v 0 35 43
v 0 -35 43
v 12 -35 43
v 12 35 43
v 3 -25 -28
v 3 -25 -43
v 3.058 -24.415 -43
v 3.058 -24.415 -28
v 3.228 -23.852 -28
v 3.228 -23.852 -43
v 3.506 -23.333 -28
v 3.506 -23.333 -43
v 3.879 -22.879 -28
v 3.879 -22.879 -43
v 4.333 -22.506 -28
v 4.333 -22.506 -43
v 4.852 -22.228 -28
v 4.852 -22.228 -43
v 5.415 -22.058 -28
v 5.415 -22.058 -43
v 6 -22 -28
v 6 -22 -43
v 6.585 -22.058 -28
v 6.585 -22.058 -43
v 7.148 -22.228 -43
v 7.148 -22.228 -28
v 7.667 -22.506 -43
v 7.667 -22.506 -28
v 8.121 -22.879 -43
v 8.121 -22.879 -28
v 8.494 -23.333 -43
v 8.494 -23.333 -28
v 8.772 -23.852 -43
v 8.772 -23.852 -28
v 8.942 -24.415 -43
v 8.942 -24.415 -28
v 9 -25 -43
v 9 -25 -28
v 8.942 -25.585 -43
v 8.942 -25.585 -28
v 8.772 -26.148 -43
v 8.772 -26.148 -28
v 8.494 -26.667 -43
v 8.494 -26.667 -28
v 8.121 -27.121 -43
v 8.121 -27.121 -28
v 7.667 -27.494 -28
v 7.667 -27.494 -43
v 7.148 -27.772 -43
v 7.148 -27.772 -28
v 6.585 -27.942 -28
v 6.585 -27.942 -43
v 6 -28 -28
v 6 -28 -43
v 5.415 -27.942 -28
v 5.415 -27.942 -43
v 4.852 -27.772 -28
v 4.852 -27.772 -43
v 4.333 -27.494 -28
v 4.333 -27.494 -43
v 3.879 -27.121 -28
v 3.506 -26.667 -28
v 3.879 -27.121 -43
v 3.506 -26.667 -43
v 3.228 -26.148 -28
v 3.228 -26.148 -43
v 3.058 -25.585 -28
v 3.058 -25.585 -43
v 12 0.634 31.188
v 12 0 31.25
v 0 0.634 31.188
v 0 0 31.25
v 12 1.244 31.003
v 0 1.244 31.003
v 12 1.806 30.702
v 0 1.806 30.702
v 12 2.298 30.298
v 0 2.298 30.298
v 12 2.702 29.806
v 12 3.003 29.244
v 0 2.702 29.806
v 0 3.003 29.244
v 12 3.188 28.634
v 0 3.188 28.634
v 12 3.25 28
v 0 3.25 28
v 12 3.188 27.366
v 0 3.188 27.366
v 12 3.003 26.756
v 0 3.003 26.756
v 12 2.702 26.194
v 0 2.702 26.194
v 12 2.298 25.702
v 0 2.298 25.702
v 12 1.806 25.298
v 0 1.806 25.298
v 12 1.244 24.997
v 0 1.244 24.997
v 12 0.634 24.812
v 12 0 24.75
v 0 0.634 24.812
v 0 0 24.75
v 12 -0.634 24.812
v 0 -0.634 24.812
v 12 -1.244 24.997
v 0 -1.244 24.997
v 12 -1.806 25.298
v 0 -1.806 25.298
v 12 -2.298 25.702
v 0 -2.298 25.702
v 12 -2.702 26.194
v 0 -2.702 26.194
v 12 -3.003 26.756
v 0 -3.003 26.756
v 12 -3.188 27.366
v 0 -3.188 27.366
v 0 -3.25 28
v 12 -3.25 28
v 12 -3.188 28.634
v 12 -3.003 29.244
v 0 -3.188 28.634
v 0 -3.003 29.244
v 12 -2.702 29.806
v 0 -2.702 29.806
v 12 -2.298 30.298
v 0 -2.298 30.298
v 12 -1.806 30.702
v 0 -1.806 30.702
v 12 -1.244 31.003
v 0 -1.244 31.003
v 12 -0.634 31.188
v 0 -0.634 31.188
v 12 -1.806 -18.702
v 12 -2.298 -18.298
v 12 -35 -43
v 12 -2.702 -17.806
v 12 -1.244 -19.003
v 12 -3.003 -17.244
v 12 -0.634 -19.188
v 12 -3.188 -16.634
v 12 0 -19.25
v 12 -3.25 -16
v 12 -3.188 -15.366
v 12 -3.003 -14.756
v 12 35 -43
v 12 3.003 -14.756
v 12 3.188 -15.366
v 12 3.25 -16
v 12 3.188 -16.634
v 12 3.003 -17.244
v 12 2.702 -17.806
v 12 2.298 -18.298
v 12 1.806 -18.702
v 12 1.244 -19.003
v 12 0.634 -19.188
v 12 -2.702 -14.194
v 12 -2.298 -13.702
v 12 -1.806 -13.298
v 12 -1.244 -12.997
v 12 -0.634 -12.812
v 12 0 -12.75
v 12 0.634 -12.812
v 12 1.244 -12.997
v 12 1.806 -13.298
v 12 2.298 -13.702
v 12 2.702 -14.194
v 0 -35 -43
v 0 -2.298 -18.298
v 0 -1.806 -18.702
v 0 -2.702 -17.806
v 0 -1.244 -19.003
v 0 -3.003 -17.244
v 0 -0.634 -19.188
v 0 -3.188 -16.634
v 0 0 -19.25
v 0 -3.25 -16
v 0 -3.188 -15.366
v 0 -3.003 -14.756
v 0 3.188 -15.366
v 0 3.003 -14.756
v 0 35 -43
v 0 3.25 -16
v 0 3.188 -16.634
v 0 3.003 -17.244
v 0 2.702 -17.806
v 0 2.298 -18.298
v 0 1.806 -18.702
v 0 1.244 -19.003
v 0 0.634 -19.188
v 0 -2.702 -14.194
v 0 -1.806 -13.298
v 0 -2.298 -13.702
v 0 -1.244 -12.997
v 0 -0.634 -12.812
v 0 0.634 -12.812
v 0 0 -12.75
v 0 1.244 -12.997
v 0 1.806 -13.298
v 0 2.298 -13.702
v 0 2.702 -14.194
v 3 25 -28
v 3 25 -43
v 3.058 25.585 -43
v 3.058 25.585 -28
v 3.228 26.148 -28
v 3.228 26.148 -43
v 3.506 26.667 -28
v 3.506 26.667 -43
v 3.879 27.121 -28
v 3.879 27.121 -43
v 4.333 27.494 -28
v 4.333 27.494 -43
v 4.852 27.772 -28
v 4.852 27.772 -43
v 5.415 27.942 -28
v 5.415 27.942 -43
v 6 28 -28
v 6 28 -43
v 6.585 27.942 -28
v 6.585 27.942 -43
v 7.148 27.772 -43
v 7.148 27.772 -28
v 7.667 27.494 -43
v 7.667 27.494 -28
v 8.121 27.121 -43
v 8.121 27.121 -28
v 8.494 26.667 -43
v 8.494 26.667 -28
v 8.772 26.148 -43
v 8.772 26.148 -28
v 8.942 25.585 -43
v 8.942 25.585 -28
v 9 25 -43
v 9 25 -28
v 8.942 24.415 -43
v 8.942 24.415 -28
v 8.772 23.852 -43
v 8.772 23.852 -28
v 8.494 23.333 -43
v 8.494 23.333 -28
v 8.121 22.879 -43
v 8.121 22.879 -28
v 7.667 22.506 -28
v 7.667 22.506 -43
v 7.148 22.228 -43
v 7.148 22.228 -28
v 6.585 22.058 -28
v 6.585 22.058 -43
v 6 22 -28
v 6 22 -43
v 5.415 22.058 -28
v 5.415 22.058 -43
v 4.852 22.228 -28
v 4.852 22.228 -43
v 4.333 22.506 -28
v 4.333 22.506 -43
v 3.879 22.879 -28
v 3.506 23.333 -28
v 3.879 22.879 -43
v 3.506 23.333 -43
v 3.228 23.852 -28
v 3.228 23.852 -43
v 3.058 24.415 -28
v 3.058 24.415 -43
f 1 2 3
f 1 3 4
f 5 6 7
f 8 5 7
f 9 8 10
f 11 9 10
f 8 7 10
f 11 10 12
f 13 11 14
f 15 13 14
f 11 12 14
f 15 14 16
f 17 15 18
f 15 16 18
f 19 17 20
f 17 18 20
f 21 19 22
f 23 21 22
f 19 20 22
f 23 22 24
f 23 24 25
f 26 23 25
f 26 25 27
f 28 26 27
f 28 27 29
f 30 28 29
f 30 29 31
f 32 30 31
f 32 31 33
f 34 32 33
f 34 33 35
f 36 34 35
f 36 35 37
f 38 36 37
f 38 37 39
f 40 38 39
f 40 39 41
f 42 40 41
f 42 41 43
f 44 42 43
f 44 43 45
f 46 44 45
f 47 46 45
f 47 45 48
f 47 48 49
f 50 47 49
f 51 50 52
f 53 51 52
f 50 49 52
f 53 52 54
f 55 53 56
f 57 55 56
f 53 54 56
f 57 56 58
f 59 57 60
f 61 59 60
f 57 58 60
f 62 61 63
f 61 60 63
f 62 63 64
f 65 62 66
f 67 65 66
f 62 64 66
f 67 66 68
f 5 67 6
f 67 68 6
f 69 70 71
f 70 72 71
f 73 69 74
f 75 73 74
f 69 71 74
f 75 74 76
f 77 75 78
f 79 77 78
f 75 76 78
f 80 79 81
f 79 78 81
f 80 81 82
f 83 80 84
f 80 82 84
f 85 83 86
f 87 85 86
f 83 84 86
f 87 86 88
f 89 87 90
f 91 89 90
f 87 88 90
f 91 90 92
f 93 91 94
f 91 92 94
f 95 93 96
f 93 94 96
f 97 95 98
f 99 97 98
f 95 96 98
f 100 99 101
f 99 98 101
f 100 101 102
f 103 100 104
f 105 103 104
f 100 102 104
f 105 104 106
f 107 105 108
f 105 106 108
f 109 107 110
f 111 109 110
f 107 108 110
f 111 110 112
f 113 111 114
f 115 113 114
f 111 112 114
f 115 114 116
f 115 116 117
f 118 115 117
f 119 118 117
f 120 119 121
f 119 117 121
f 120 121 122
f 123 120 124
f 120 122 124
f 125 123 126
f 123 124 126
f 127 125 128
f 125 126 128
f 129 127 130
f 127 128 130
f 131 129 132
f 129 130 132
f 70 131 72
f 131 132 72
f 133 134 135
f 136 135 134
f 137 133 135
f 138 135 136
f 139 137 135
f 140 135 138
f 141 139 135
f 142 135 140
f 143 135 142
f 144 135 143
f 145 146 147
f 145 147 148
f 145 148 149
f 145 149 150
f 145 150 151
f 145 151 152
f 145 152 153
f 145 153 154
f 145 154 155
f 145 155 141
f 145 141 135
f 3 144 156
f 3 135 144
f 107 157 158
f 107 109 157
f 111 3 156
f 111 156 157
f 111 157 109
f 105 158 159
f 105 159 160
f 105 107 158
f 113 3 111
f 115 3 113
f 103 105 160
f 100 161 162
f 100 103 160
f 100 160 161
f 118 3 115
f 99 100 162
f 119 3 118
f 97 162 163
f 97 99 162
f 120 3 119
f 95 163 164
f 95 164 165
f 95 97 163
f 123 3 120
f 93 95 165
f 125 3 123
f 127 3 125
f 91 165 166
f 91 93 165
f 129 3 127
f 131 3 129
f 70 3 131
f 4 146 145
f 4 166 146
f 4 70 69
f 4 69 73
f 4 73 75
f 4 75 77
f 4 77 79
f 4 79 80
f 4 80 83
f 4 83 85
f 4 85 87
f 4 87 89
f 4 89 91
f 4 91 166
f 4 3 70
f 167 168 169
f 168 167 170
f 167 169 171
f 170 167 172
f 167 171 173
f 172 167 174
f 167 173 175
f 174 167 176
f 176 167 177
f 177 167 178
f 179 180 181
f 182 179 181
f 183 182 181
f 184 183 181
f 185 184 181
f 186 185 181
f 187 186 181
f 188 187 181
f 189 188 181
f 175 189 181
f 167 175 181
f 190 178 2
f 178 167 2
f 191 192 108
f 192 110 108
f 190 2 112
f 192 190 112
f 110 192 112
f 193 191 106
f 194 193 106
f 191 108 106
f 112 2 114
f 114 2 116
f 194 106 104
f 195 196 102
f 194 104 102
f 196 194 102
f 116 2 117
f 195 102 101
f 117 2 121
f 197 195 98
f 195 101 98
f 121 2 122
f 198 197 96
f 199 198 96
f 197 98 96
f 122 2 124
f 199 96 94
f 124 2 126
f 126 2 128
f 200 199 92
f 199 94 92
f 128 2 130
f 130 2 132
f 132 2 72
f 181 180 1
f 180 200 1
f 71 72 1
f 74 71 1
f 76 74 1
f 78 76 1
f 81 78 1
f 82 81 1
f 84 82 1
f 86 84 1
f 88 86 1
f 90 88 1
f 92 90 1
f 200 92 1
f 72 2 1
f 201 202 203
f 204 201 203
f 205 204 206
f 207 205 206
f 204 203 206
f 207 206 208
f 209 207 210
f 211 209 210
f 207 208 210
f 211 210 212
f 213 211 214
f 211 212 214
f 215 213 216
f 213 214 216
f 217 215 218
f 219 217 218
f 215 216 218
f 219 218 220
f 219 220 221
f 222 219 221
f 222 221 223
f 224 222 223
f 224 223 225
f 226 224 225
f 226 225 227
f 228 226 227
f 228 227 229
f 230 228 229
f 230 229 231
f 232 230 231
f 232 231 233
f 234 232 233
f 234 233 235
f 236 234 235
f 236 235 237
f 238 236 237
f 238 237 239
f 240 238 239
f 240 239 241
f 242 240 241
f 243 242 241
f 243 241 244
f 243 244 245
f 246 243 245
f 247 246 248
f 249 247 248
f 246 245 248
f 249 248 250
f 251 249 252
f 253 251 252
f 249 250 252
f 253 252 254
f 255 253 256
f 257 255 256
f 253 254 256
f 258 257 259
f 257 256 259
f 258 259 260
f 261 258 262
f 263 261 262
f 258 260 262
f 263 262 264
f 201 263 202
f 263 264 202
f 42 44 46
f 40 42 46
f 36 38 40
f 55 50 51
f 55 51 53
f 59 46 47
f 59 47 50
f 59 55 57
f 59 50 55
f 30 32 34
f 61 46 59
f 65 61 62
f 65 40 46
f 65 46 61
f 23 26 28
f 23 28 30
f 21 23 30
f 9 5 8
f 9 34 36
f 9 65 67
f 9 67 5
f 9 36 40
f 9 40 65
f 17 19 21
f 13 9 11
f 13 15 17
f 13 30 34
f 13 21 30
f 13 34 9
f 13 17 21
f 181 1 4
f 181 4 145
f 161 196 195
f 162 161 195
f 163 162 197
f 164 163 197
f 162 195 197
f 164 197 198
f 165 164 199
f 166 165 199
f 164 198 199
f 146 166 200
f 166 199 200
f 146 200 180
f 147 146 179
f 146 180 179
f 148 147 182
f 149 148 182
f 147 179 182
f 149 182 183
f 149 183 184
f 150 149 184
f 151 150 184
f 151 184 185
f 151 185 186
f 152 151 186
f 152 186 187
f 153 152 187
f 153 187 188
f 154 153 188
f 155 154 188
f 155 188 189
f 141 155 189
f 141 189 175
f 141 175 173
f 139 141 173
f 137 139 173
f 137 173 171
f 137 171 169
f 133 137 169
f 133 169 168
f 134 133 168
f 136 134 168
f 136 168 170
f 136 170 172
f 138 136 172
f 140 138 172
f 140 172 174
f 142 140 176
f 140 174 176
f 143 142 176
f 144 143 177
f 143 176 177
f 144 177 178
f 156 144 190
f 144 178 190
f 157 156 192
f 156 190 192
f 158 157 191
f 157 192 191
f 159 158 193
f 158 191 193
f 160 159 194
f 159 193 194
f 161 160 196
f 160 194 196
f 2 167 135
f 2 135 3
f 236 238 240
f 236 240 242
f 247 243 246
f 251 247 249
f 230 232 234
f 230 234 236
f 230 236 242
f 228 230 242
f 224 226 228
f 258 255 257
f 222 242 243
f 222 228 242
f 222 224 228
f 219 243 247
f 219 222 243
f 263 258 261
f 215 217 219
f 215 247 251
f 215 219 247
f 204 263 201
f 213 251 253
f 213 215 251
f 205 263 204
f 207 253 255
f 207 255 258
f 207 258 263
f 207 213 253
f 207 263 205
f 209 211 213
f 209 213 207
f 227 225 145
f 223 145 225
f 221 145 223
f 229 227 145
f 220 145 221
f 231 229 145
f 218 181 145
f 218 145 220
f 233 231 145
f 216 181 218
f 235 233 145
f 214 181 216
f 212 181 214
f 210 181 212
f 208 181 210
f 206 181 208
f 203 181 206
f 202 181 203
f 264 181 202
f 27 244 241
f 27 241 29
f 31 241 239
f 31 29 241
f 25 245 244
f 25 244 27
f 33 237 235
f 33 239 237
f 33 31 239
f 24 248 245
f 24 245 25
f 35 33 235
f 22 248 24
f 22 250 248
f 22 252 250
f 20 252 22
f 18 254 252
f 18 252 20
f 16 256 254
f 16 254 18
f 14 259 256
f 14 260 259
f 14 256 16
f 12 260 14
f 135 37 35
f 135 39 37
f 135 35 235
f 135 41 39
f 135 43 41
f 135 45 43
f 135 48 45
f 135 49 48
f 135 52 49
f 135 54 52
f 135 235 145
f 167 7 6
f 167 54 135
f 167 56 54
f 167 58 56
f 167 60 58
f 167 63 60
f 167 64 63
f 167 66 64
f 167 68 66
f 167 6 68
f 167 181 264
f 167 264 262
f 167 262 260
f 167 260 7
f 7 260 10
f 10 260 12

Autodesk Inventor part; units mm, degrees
ref_plane "YZ Plane" through (0, 0, 0) normal (1, 0, 0) x (0, 1, 0)
ref_plane "XZ Plane" through (0, 0, 0) normal (0, 1, 0) x (-1, 0, 0)
ref_plane "XY Plane" through (0, 0, 0) normal (0, 0, 1) x (1, 0, 0)
sketch "Sketch1" plane through (0, 0, 0) normal (1, 0, 0) x (0, 1, 0)
  line L0 (-35, 43) -> (35, 43)
  line L1 (35, 43) -> (35, -43)
  line L2 (35, -43) -> (-35, -43)
  line L3 (-35, -43) -> (-35, 43)
  line L4 (-35, 43) -> (35, -43) construction
  line L5 (35, 43) -> (-35, -43) construction
  point P0 (0, 0)
  dimension "d0" = 86
  dimension "d1" = 70
extrude "Extrusion1" add sketch "Sketch1" along normal blind 12
ref_plane "Work Plane1" through (0, 0, 43) normal (0, 1, 0) x (1, 0, 0)
sketch "Sketch2" plane through (0, -35, -43) normal (0, 0, -1) x (-1, 0, 0)
  circle A0 centre (-6, 60) radius 3
  circle A1 centre (-6, 35) radius 3 construction
  circle A2 centre (-6, 10) radius 3
  line L0 (0, 70) -> (-12, 70) projected
  line L1 (-6, 70) -> (-6, 0) construction
  line L2 (0, 0) -> (-12, 0) projected
  point P0 (0, 35)
  dimension "d4" = 6
  dimension "d5" = 25
  dimension "d6" = 25
extrude "Extrusion2" cut sketch "Sketch2" against normal blind 15
sketch "Sketch3" plane through (12, 0, 0) normal (1, 0, 0) x (0, 0, -1)
  circle A0 centre (-46.1752, 0) radius 3 projected
  circle A1 centre (-111.1482, 0) radius 3 projected
  circle A2 centre (-90.1752, 0) radius 3 projected
  point P0 (0, 0)
extrude "Extrusion3" cut sketch "Sketch3" against normal through all
sketch "Sketch4" plane through (0, 0, 0) normal (-1, 0, 0) x (0, 0, 1)
  circle A0 centre (28, 0) radius 3 construction
  circle A1 centre (-16, 0) radius 3 construction
  circle A2 centre (28, 0) radius 3.25
  circle A3 centre (-16, 0) radius 3.25
  point P0 (0, 0)
  dimension "d13" = 0.25
  dimension "d14" = 0.25
extrude "Extrusion4" cut sketch "Sketch4" against normal through all
thread "Thread1" size "M6x1" class "6H" standard "ANSI Metric M Profile" full length
thread "Thread2" size "M6x1" class "6H" standard "ANSI Metric M Profile" full length
properties part number "MotorHolderLongAxisBottom"
